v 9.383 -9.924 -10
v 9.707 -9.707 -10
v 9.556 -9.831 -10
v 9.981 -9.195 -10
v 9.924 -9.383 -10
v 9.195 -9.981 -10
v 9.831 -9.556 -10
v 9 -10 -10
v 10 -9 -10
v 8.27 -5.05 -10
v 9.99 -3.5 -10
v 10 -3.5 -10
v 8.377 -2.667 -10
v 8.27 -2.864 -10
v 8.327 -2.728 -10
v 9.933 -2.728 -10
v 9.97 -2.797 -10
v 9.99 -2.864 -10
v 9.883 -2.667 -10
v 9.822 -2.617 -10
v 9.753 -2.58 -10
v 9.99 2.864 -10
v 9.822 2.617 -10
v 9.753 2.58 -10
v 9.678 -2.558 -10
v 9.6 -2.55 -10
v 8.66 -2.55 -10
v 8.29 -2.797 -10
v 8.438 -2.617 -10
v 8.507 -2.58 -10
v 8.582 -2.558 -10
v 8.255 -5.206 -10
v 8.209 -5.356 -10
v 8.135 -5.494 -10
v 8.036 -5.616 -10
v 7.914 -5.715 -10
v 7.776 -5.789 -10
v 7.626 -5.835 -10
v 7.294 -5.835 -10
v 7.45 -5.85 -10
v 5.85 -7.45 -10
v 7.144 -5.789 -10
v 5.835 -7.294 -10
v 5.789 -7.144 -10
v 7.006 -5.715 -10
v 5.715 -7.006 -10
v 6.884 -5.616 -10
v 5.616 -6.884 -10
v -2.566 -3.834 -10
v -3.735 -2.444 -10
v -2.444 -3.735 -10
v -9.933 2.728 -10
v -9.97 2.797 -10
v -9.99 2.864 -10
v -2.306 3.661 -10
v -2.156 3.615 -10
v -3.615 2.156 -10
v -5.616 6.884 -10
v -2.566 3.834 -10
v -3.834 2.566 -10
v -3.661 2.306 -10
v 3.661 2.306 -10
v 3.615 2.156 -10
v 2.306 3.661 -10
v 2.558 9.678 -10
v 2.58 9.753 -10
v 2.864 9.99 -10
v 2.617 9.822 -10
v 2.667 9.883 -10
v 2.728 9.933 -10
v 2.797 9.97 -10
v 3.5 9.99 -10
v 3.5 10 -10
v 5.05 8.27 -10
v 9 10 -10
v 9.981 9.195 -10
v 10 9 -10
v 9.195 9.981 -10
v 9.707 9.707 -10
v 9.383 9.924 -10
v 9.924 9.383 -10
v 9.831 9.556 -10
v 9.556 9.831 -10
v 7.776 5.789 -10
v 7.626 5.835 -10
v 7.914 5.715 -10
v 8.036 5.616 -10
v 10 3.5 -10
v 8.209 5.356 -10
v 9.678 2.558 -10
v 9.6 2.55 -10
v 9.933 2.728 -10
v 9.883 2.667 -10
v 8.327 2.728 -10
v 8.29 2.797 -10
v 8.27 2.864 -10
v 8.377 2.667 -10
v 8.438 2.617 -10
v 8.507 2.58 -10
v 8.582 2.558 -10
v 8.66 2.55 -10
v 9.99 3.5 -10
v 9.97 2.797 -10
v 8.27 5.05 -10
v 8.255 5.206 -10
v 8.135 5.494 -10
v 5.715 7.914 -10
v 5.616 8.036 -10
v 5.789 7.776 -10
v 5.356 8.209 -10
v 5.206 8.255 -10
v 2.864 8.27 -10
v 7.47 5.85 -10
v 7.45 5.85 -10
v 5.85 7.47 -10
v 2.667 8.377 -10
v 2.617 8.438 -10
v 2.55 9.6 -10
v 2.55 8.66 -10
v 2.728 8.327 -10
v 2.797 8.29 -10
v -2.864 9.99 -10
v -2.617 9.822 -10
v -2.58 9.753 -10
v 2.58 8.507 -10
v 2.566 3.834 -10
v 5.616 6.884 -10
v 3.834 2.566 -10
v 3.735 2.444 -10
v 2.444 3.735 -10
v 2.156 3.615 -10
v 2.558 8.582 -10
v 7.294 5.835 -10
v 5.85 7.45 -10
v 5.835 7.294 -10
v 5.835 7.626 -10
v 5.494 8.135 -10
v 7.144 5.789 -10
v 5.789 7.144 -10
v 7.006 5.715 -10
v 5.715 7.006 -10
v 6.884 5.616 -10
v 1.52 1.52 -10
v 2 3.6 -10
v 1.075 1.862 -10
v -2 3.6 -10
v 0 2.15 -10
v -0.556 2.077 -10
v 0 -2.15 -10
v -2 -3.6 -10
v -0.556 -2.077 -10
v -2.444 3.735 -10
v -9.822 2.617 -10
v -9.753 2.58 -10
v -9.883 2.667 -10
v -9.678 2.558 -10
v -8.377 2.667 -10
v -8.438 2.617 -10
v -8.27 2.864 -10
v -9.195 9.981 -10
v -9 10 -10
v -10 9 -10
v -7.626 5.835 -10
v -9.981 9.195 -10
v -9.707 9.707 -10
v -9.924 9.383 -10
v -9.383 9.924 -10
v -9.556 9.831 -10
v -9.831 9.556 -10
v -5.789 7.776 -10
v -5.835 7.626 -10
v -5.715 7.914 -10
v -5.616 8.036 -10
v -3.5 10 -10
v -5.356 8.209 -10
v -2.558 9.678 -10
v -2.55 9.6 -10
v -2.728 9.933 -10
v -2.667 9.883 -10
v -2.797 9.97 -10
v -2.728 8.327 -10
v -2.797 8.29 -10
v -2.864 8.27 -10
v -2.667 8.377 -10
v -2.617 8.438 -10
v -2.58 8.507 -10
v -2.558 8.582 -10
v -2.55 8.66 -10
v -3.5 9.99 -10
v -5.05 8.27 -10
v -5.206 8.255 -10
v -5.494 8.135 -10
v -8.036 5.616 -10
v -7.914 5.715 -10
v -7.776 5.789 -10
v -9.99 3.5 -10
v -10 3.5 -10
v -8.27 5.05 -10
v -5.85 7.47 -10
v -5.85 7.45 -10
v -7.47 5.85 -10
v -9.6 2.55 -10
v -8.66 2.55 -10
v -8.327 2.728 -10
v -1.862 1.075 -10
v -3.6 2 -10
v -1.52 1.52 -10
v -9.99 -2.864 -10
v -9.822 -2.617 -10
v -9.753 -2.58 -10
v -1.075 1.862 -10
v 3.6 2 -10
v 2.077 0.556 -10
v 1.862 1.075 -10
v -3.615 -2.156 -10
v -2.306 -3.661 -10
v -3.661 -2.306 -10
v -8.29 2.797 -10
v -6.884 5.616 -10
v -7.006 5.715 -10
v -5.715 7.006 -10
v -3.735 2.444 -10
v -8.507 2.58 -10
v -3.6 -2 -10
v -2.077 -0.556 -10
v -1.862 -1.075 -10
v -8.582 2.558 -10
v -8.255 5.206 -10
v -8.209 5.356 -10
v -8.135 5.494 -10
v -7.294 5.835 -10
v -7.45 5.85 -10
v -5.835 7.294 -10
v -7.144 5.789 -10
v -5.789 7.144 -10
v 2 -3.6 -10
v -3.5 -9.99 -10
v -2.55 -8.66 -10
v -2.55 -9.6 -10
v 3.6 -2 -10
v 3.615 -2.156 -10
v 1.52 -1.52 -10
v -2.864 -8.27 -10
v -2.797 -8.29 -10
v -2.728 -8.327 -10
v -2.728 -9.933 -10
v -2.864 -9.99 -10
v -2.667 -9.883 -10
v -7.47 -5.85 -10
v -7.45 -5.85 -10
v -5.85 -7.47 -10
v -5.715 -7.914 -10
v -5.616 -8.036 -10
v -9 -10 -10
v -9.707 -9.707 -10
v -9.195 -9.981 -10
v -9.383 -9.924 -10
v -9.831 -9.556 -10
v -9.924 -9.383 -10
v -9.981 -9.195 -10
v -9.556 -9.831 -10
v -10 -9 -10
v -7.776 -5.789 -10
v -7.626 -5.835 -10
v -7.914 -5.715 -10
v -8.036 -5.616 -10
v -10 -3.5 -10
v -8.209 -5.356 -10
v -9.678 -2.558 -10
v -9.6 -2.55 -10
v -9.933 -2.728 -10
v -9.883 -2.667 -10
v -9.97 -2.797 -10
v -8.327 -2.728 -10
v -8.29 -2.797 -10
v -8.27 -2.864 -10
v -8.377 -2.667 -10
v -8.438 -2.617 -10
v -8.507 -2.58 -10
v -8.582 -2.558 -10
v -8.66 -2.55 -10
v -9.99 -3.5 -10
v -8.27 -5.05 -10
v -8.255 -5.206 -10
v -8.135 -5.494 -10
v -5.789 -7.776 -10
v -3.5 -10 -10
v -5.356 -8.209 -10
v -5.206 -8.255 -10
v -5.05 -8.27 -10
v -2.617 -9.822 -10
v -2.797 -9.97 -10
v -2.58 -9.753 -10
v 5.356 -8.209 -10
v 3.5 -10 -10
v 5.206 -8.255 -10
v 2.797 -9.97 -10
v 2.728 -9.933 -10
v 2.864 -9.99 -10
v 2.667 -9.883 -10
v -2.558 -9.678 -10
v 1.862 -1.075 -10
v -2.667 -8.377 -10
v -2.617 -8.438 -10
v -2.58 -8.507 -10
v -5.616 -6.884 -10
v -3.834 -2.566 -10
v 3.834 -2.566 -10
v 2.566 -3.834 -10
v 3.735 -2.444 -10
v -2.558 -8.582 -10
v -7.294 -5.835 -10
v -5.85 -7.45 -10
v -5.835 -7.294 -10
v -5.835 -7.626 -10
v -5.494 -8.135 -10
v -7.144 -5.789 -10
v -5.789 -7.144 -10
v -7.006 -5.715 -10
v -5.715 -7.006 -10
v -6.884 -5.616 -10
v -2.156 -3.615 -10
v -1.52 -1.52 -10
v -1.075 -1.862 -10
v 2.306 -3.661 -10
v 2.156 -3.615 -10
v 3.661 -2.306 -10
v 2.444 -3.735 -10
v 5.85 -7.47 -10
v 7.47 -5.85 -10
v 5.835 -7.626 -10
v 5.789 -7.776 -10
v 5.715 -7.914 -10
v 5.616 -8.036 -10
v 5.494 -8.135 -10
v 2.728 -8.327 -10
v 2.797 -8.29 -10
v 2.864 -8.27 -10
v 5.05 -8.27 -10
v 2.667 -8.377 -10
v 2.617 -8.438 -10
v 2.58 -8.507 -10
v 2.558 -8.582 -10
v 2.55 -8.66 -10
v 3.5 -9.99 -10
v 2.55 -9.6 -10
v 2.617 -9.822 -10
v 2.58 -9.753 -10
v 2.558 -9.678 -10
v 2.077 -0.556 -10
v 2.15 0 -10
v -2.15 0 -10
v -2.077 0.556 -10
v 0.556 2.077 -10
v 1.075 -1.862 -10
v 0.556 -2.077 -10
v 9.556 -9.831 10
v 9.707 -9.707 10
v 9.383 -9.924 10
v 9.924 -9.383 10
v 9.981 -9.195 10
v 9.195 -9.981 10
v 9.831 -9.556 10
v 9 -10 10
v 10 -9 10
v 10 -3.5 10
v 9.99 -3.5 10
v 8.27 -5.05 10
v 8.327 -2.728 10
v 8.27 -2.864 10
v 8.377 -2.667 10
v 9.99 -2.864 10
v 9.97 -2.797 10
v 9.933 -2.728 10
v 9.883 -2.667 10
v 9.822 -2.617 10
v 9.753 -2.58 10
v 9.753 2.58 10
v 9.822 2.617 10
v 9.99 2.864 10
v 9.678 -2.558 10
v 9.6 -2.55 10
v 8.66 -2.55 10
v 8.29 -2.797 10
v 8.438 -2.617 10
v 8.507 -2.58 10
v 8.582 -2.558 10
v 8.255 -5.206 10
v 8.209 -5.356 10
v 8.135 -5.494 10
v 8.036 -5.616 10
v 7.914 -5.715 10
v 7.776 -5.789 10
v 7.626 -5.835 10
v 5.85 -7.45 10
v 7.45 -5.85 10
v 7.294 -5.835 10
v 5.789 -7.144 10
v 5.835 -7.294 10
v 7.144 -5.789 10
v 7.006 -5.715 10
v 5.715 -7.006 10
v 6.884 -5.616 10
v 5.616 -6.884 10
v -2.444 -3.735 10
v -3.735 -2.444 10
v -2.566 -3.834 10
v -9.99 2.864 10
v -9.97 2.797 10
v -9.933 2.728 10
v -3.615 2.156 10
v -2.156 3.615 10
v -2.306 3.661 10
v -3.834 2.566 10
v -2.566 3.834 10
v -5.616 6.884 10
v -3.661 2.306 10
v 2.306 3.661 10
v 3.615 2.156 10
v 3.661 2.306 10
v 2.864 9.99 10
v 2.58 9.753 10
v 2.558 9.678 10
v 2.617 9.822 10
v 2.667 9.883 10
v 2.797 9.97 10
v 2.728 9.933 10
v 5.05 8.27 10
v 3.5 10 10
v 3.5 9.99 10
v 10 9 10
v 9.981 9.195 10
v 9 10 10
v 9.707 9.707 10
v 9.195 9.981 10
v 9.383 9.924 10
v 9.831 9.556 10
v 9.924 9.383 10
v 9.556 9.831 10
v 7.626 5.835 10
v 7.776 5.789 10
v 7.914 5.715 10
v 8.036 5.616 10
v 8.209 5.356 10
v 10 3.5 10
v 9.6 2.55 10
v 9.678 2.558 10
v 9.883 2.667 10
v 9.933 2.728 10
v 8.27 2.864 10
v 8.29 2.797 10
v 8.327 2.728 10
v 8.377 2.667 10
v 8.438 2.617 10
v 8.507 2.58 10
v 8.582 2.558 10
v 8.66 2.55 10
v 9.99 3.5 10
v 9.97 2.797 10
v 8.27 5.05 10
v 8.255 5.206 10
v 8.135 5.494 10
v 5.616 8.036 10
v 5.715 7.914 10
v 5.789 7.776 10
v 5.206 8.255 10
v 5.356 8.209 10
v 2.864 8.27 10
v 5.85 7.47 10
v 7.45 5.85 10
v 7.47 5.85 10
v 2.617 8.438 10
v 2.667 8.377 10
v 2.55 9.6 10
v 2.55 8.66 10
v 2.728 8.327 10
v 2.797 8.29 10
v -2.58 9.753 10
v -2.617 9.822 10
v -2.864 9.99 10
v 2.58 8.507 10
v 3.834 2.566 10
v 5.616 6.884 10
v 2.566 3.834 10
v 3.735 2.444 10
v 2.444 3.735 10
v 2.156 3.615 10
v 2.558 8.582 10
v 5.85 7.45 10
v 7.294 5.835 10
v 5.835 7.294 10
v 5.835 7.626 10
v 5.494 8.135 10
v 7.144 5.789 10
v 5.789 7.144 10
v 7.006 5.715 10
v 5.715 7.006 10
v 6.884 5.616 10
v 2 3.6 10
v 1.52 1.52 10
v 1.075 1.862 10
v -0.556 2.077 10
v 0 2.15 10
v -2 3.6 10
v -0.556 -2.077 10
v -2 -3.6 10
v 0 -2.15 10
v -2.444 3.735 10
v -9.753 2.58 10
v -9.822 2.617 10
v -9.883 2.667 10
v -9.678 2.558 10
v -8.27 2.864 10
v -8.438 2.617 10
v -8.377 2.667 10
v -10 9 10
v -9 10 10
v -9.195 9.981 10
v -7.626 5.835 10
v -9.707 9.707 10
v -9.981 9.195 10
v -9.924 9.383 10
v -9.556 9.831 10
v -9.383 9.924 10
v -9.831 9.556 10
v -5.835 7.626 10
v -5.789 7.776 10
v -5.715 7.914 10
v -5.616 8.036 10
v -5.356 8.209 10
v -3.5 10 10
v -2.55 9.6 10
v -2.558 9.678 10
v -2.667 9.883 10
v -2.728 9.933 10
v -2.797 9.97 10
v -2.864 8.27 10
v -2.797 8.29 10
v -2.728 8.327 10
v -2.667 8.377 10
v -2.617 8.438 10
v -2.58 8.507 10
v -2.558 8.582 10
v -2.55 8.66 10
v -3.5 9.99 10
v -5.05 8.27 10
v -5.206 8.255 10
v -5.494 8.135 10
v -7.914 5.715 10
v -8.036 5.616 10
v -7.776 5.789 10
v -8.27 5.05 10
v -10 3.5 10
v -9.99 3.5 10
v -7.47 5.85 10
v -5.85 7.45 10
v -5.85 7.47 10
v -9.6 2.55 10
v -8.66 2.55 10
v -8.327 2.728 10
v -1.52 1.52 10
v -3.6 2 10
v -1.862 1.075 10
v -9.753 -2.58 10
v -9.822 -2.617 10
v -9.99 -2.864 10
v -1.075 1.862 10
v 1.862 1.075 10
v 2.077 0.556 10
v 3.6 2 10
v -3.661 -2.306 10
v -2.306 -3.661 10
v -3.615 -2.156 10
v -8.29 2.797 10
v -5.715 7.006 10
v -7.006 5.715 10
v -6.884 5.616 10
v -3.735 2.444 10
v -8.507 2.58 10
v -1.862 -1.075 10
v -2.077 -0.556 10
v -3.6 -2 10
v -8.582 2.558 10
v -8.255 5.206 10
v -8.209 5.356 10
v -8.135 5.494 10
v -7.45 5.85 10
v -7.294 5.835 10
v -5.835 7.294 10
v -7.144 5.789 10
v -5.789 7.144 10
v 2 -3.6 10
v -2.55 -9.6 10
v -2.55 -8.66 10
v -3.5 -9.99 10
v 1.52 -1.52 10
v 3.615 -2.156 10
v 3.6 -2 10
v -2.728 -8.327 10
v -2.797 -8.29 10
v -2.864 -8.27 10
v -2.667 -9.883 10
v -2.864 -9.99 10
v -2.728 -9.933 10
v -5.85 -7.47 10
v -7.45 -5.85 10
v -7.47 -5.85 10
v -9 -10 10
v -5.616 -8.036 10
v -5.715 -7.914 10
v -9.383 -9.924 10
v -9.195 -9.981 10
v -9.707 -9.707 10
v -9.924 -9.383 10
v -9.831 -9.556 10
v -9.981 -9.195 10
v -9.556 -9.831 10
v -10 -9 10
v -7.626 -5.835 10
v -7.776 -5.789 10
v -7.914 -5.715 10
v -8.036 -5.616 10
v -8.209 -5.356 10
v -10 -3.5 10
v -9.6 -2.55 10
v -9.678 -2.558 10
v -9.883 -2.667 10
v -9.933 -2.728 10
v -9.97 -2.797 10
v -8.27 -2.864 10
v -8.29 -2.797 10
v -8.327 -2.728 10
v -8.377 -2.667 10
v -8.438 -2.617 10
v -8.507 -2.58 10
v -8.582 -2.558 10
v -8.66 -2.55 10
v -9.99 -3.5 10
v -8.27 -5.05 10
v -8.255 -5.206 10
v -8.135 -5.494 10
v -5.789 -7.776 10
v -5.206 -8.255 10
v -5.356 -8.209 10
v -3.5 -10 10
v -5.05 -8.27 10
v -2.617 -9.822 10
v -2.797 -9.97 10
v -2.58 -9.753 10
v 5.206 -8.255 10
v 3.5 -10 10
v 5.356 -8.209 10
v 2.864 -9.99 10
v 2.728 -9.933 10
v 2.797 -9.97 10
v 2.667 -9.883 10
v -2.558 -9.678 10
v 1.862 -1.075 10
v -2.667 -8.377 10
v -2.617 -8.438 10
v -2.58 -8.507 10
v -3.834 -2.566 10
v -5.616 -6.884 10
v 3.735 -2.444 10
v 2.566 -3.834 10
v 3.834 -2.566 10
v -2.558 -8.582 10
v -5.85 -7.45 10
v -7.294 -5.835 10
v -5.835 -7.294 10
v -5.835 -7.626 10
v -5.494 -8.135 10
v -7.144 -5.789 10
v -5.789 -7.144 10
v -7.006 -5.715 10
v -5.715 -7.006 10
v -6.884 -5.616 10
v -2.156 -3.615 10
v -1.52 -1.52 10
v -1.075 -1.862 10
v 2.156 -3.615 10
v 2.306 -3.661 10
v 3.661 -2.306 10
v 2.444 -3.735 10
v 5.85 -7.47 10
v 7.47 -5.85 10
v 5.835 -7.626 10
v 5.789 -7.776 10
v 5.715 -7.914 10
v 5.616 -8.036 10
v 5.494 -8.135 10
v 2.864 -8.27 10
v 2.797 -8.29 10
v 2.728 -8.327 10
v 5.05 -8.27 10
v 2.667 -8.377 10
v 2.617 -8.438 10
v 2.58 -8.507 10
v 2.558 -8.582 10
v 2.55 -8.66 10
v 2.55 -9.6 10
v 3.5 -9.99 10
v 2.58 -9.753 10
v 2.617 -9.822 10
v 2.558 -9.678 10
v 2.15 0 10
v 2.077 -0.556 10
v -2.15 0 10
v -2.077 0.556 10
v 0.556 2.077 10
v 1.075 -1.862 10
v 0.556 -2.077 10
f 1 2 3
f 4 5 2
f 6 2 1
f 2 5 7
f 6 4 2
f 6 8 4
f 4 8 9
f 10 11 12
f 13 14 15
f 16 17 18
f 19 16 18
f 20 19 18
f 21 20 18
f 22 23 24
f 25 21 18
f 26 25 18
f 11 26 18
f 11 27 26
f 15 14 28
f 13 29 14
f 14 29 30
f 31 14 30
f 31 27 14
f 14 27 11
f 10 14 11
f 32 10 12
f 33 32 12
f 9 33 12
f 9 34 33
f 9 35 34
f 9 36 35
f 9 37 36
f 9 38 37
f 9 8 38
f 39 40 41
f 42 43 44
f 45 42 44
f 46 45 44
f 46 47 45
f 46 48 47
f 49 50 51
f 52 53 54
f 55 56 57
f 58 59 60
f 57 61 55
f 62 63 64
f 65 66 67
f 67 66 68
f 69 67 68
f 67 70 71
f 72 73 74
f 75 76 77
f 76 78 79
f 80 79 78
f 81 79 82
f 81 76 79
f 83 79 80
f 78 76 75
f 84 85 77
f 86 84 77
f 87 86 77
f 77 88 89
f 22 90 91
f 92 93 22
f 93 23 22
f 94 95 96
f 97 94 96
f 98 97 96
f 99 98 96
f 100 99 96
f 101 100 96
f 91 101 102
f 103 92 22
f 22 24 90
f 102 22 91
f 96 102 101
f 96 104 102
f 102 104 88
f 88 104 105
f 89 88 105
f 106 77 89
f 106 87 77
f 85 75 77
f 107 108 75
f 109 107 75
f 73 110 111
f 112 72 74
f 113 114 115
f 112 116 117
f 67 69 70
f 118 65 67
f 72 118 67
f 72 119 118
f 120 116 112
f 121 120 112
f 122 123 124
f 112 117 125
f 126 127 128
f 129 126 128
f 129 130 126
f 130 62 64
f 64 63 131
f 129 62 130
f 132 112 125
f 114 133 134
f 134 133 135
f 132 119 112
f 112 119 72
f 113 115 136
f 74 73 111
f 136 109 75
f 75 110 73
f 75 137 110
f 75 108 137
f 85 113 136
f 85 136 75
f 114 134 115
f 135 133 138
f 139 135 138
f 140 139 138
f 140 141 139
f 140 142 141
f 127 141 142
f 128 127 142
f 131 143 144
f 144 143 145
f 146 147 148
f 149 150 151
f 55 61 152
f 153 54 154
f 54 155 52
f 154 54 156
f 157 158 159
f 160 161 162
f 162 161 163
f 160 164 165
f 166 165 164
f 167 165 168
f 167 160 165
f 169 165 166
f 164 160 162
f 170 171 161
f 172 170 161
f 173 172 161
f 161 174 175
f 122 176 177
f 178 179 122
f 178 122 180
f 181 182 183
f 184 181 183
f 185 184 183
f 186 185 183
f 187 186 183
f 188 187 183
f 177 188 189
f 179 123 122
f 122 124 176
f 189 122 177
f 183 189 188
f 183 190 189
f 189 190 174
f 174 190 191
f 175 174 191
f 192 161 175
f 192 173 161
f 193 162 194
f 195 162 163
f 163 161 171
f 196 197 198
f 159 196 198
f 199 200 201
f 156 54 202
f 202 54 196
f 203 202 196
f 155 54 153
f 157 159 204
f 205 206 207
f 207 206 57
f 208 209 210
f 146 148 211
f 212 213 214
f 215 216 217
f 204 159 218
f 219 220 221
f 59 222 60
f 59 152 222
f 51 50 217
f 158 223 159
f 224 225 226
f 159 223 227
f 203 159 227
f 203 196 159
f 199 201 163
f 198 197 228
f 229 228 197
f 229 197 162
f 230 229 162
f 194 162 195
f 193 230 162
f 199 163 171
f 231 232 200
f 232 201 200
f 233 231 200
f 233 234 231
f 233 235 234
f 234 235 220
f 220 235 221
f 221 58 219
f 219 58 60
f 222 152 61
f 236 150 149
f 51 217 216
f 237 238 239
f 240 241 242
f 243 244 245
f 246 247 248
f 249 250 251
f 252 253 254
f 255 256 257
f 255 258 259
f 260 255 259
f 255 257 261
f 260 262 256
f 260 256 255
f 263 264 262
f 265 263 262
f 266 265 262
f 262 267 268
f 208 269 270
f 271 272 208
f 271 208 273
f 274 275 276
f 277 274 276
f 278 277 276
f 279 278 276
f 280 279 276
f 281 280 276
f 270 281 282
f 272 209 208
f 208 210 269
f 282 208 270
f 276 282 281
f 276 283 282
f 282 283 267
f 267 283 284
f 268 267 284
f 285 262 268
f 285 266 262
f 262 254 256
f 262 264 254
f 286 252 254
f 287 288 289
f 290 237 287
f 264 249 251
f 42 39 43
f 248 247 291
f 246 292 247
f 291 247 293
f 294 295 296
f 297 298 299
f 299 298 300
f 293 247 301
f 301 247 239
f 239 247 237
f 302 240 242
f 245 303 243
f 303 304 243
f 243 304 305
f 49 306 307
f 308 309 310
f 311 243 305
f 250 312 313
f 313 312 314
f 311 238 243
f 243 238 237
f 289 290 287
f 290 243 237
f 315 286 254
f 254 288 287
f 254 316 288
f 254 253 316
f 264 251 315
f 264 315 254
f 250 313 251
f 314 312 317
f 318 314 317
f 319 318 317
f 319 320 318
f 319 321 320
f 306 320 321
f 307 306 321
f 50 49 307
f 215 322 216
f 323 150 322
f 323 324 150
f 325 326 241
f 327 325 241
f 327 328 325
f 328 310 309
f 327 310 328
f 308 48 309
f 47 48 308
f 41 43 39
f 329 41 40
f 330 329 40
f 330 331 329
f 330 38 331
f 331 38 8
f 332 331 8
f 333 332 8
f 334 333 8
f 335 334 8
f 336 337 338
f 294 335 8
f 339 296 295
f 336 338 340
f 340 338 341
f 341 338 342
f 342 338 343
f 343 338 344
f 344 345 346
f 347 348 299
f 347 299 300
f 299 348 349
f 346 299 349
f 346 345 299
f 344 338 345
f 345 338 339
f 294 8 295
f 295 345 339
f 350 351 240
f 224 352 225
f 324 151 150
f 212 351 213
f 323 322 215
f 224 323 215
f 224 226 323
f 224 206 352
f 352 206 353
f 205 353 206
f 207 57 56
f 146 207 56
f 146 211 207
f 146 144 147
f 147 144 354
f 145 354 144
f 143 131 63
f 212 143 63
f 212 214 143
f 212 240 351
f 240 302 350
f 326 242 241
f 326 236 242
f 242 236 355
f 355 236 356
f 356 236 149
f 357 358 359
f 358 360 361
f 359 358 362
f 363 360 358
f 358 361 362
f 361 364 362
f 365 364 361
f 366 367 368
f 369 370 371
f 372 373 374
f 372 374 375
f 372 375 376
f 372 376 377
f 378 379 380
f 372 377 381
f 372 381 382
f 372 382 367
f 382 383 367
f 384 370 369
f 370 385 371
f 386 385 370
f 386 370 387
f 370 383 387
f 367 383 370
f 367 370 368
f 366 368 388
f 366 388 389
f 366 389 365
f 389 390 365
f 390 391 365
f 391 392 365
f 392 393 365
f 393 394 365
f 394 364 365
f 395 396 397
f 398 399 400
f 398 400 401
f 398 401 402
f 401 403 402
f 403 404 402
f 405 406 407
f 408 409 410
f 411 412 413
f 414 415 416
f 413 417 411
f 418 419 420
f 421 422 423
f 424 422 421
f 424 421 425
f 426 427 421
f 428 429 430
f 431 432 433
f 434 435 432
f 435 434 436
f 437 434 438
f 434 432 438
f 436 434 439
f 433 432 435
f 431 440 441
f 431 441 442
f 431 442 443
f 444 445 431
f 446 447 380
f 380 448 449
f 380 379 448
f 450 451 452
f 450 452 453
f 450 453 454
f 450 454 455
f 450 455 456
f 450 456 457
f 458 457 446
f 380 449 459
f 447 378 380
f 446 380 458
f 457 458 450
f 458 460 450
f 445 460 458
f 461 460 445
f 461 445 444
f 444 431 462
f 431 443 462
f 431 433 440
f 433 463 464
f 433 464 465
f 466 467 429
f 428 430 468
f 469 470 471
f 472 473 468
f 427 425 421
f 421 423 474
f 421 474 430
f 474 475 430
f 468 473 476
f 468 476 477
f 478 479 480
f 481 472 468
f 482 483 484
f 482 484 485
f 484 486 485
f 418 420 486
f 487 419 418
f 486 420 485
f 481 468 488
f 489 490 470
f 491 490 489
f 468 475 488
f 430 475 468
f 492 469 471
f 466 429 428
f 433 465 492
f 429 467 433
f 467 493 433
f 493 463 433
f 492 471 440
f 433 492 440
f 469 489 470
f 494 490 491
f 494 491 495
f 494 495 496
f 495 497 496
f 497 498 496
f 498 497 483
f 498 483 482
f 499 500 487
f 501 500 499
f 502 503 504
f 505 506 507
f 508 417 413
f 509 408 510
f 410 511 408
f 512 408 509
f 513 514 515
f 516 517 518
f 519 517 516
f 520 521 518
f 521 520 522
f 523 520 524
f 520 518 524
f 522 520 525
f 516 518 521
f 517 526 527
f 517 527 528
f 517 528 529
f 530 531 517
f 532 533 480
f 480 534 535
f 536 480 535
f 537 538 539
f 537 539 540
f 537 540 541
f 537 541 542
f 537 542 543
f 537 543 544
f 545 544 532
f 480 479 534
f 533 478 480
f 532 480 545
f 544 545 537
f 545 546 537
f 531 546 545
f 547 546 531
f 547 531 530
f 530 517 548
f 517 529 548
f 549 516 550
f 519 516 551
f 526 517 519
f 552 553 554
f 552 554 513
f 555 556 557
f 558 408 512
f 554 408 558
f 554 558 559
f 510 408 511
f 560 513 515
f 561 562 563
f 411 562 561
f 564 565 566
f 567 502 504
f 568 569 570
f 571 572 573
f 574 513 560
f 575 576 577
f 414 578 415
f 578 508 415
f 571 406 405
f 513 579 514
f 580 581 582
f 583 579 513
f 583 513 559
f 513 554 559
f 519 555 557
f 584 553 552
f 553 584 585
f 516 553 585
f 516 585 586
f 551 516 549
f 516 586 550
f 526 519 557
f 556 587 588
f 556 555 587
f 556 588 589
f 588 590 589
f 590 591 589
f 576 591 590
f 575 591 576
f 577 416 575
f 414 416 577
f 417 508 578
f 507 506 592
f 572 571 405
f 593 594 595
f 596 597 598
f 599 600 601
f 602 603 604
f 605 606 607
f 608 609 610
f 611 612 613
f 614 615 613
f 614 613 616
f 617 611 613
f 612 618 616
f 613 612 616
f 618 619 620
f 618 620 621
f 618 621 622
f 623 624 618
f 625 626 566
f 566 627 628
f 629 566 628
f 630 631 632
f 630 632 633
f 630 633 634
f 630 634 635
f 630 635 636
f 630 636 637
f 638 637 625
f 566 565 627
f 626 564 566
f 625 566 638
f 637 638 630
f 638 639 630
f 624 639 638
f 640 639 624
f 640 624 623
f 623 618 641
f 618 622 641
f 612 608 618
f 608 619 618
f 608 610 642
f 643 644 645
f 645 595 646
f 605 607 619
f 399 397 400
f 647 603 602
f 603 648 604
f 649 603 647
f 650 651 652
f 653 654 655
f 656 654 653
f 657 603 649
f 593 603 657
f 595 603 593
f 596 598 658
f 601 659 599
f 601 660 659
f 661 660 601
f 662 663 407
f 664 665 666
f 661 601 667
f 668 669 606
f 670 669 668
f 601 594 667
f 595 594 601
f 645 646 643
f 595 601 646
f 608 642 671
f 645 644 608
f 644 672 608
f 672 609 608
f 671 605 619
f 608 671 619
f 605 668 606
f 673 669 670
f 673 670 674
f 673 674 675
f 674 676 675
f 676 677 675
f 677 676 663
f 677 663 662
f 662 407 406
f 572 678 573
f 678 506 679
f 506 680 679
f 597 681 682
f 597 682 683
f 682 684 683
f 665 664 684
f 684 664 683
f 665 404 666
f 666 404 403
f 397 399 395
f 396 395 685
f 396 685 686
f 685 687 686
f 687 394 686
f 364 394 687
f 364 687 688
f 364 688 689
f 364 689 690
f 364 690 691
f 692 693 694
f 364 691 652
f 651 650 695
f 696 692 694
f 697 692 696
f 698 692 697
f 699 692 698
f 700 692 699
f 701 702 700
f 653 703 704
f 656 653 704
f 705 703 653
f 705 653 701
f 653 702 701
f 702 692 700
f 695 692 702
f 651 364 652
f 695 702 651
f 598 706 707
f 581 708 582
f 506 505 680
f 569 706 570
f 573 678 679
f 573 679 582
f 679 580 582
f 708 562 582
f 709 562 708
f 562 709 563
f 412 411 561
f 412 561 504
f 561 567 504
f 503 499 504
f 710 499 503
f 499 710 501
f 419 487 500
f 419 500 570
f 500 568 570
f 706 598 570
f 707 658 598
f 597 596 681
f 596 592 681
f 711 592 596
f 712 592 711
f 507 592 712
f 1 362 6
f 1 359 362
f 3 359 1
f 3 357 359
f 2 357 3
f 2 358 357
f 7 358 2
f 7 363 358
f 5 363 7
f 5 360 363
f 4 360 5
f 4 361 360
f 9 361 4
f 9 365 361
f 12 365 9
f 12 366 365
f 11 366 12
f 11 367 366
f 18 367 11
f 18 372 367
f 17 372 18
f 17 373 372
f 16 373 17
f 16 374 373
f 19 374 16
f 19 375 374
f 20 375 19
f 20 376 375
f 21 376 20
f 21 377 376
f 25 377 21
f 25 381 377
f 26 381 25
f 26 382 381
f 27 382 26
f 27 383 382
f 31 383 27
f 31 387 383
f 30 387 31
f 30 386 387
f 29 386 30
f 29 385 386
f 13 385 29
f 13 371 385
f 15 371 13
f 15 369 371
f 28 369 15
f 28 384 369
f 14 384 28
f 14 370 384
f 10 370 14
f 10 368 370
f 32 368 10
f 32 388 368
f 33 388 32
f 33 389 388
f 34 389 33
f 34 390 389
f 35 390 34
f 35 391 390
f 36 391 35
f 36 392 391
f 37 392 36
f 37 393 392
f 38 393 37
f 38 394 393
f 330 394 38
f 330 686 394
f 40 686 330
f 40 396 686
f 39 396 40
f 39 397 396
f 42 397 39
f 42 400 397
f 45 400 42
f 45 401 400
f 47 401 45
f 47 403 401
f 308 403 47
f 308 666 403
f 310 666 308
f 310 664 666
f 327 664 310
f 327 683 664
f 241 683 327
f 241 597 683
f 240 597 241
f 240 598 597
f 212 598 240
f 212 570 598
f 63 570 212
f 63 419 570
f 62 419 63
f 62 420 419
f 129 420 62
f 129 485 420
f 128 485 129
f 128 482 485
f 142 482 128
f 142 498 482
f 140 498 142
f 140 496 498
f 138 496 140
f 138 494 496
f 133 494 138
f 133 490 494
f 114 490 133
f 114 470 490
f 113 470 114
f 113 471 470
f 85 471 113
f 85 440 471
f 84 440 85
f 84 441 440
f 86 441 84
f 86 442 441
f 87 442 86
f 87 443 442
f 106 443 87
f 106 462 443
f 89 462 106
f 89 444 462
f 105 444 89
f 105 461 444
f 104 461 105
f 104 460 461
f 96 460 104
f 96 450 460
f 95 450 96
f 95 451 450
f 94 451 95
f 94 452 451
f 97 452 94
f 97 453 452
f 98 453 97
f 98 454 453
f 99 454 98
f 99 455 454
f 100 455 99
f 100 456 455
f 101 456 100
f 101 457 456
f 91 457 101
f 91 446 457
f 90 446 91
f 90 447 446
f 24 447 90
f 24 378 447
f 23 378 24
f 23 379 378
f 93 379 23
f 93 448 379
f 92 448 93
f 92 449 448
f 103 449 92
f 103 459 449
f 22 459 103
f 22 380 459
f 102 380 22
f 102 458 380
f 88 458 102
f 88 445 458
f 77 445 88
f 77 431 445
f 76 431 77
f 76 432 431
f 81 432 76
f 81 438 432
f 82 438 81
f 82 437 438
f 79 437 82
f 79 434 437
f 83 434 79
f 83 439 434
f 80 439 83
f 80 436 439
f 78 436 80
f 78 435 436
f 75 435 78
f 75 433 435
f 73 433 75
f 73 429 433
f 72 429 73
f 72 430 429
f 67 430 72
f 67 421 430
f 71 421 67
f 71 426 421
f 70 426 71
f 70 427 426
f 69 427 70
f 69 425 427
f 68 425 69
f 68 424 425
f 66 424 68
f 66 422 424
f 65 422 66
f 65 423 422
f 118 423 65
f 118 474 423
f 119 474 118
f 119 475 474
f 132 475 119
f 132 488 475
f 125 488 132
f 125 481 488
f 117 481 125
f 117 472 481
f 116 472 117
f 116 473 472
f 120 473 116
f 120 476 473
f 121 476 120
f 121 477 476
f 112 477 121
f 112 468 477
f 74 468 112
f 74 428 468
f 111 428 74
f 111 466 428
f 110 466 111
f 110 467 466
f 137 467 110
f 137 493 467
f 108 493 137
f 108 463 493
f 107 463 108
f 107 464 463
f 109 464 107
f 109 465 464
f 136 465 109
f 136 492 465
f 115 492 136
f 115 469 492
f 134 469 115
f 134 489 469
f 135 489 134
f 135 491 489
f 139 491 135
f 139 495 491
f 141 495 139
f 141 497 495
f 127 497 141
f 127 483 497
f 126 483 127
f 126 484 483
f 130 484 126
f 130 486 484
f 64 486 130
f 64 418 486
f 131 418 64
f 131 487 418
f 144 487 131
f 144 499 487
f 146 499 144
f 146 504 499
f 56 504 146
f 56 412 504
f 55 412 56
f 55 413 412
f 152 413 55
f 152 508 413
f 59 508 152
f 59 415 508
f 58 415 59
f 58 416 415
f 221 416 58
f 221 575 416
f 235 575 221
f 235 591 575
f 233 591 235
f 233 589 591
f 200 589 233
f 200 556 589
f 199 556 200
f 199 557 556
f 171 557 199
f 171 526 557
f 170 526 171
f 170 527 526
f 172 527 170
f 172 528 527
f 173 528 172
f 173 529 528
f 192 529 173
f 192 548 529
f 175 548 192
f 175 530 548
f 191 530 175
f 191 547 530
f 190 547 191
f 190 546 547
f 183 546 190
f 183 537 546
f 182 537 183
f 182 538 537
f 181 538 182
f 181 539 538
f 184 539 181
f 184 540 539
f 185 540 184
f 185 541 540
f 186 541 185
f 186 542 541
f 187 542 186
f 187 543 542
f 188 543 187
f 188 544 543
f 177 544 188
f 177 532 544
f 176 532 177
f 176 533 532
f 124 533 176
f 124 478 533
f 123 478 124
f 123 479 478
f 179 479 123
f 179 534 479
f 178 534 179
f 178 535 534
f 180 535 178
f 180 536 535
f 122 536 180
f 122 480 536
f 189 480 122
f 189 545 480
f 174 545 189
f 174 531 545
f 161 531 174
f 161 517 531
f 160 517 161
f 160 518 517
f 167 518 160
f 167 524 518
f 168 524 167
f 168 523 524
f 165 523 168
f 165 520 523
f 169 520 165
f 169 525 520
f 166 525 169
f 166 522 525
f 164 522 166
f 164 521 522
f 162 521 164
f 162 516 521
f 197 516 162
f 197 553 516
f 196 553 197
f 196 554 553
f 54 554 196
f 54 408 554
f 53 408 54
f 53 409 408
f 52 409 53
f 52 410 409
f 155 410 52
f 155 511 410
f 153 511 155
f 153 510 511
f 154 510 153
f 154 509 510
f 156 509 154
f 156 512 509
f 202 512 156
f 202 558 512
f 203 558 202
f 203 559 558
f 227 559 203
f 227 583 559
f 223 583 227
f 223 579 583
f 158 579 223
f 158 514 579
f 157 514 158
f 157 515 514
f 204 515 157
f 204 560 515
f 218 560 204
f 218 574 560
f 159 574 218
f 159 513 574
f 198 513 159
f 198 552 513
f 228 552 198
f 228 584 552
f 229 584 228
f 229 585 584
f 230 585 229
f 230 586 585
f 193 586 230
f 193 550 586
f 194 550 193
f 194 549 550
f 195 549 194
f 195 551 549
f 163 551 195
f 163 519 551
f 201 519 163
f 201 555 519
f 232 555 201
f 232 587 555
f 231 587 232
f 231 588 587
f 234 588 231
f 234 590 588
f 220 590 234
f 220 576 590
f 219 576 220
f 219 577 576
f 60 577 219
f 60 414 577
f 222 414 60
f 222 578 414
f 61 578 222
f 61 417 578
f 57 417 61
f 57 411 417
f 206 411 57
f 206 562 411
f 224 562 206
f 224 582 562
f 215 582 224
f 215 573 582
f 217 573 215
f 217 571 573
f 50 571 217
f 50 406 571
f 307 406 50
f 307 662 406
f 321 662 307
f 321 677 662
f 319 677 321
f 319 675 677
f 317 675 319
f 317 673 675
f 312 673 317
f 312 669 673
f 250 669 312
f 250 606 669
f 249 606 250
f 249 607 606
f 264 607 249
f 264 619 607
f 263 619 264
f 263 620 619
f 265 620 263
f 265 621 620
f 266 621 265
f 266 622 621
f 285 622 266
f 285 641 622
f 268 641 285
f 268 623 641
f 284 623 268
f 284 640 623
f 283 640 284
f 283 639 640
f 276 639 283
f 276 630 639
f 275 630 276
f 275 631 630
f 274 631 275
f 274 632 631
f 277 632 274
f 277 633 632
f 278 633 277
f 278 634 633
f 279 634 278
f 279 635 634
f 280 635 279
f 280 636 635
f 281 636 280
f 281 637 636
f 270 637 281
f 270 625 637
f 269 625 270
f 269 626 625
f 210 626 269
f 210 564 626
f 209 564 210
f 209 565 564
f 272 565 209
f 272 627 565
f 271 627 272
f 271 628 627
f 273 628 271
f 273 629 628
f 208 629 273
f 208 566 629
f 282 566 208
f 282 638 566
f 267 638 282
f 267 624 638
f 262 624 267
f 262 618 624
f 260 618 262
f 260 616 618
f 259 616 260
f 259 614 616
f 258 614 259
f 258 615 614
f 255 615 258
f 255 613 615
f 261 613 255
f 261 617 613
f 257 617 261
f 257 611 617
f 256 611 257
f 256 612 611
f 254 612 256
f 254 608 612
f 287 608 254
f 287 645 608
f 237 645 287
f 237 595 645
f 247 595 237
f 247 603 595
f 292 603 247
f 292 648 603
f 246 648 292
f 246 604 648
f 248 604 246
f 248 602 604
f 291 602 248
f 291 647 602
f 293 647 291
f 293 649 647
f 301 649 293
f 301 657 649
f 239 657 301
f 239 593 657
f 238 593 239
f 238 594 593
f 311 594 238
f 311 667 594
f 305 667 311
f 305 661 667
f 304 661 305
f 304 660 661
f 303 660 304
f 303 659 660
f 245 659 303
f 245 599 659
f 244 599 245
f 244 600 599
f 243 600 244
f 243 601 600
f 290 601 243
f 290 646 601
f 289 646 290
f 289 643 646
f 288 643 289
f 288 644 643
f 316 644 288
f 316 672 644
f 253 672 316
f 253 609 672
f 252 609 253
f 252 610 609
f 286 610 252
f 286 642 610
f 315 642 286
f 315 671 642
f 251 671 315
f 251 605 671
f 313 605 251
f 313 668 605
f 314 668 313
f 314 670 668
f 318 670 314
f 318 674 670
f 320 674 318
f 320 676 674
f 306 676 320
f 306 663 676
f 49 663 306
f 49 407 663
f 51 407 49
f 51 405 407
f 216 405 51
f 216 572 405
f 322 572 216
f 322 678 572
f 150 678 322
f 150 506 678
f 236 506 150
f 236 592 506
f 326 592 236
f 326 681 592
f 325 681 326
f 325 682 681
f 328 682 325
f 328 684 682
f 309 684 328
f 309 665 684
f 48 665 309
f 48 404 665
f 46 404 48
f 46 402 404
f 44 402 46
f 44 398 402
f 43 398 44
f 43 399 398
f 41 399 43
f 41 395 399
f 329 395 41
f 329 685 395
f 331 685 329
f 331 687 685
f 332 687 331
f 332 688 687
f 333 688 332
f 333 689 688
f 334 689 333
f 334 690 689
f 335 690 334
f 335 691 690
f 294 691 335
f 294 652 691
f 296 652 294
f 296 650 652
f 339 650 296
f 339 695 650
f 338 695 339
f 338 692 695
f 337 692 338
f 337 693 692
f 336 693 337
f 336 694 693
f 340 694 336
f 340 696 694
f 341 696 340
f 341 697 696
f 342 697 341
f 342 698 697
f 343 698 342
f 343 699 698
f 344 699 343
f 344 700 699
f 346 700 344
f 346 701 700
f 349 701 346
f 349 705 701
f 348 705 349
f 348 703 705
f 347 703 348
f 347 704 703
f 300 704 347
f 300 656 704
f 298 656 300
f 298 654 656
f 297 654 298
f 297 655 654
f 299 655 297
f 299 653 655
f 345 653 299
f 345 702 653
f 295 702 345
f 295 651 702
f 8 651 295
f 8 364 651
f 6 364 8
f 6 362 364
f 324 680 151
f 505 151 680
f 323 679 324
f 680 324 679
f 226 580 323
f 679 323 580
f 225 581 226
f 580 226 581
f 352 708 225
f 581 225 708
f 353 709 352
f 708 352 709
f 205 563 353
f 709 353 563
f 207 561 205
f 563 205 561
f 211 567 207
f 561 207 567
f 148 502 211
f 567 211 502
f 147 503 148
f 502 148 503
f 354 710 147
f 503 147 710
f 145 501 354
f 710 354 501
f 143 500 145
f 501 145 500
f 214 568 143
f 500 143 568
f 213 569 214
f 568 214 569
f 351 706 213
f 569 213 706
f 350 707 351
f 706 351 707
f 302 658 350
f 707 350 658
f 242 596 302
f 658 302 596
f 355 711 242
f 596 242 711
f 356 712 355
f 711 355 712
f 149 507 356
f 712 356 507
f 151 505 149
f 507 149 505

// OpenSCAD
/** 
 * @file
 * Generic library for fractional T-Slot extrusions.
 *
 * Creative Commons Share Alike 3.0
 * Copyright (c) 2014 Manuel García
 *
 * Original library (David Lee Miller)
 * https://www.thingiverse.com/thing:136430
 * 
 * Modified to be used in customizer
 */ 

//CUSTOMIZER VARIABLES

ProfileCore = 4.3 * 1;     // Profile core Ø (Default M5).
minkR_TS = 0.04 * 20;  // Minkowski radius for the T-Slot.
minkR_IC = 0.075 * 20; // Minkowski radius for the inner cutout.
minkR_PF = 0.05 * 20;  // Minkowski radius for the profile corners.

//Choose the TShot
profile = "2020"; //[2020, 2040, 2060, 2080]

//Choose the Profile Core
profile_core = "M5"; //[M5, M6]

//Select Height in Millimeters
height_in_mm = 20;

if(profile_core == "M5"){
    ProfileCore = 4.3;     // Profile core Ø (Default M5).
} else if(profile_core == "M6"){
    ProfileCore = 5.3;     // Profile core Ø (M6).
}

if(profile == "2020"){
    2020Profile(height_in_mm);
}else if(profile == "2040"){
    2040Profile(height_in_mm);
}

//CUSTOMIZER VARIABLES END

module 2020Profile(height, core = ProfileCore) {
  linear_extrude(height = height, center = true)
  union() {
    difference() {
      minkowski() {
        translate([0, 0, 0]) circle(r = minkR_PF, center = true, $fn = 32);
        square([1 * 20 - 2 * minkR_PF, 1 * 20 - 2 * minkR_PF], center = true);
      }
      translate([0, 0, 0]) circle(r = core / 2, $fn = 24);
      translate([-0.5 * 20 + 0.087 * 20, 0, 0]) tSlot();
      rotate([0, 0, 180]) translate([-0.5 * 20 + 0.087 * 20, 0, 0]) tSlot();
      translate([0, -0.5 * 20 + 0.087 * 20, 0]) rotate([0, 0, 90]) tSlot();
      translate([0, 0.5 * 20 - 0.087 * 20, 0]) rotate([0, 0, -90]) tSlot();
    }
  }
}

module 2040Profile(height, core = ProfileCore) {
  linear_extrude(height = height, center = true)
  difference() {
    minkowski() {
      translate([0, 0, 0]) circle(r = minkR_PF, center = true, $fn = 32);
      square([1 * 20 - 2 * minkR_PF, 2 * 20 - 2 * minkR_PF], center = true);
    }
    translate([0, 0.5 * 20, 0]) circle(r = core / 2, $fn = 24);
    translate([0, -0.5 * 20, 0]) circle(r = core / 2, $fn = 24);
    translate([0, 0, 0]) insideCutout();
    translate([-0.5 * 20 + 0.087 * 20, 0.5 * 20, 0]) tSlot();
    rotate([0, 0, 180]) translate([-0.5 * 20 + 0.087 * 20, 0.5 * 20, 0]) tSlot();
    translate([-0.5 * 20 + 0.087 * 20, -0.5 * 20, 0]) tSlot();
    rotate([0, 0, 180]) translate([-0.5 * 20 + 0.087 * 20, -0.5 * 20, 0]) tSlot();
    translate([0, -1 * 20 + 0.087 * 20, 0]) rotate([0, 0, 90]) tSlot();
    translate([0, 1 * 20 - 0.087 * 20, 0]) rotate([0, 0, -90]) tSlot();
  }
}

module fillet(rad) {
  translate([-rad, -rad, 0])
  difference() {
    translate([0, 0, 0]) square([rad + 0.01, rad + 0.01]);
    circle(r = rad, center = true, $fn = 32);
  }
}

module insideCutout() {
  minkowski() {
    translate([0, 0, 0]) circle(r = minkR_IC, center = true, $fn = 32);
    hull() {
      square([0.2 * 20 - minkR_IC, 0.645 * 20 - 2 * minkR_IC], center = true);
      square([0.8 * 20 - 2 * minkR_IC, 0.001 * 20], center = true);
    }
  }
}

module doubleCutout() {
  union() {
    minkowski() {
      translate([0, 0, 0]) circle(r = minkR_IC, center = true, $fn = 32);
      union() {
        rotate([0, 0, 0]) hull() {
          translate([-0.5 * 20, 0, 0]) hull() {
            square([0.2 * 20 - minkR_IC, 0.645 * 20 - 2 * minkR_IC], center = true);
            square([0.8 * 20 - 2 * minkR_IC, 0.001 * 20], center = true);
          }
          translate([0.5 * 20, 0, 0]) hull() {
            square([0.2 * 20 - minkR_IC, 0.645 * 20 - 2 * minkR_IC], center = true);
            square([0.8 * 20 - 2 * minkR_IC, 0.001 * 20], center = true);
          }
        }
        rotate([0, 0, 90]) hull() {
          translate([-0.5 * 20, 0, 0]) hull() {
            square([0.2 * 20 - minkR_IC, 0.645 * 20 - 2 * minkR_IC], center = true);
            square([0.8 * 20 - 2 * minkR_IC, 0.001 * 20], center = true);
          }
          translate([0.5 * 20, 0, 0]) hull() {
            square([0.2 * 20 - minkR_IC, 0.645 * 20 - 2 * minkR_IC], center = true);
            square([0.8 * 20 - 2 * minkR_IC, 0.001 * 20], center = true);
          }
        }
      }
    }
    rotate([0, 0, 0]) translate([-0.645 * 20 / 2, -0.645 * 20 / 2, 0]) fillet(minkR_IC);
    rotate([0, 0, 180]) translate([-0.645 * 20 / 2, -0.645 * 20 / 2, 0]) fillet(minkR_IC);
    rotate([0, 0, 90]) translate([-0.645 * 20 / 2, -0.645 * 20 / 2, 0]) fillet(minkR_IC);
    rotate([0, 0, -90]) translate([-0.645 * 20 / 2, -0.645 * 20 / 2, 0]) fillet(minkR_IC);
  }
}

module tSlot() {
  union() {
    translate([minkR_TS, 0, 0])
    minkowski() {
      translate([0, 0, 0]) circle(r = minkR_TS, center = true, $fn = 32);
      hull() {
        square([0.001 * 20, 0.585 * 20 - 2 * minkR_TS], center = true);
        translate([(0.233 * 20 - 2 * minkR_TS) / 2, 0, 0]) square([0.233 * 20 - 2 * minkR_TS, 0.2 * 20], center = true);
      }
    }
    translate([-0.255 * 20 / 2 + 0.01, 0, 0]) square(0.255 * 20, center = true);
    translate([-0.35 * 20 / 2 - 0.087 * 20 + 0.01, 0, 0]) square(0.35 * 20, center = true);
    translate([0, -0.255 * 20 / 2, 0]) fillet(minkR_TS / 2);
    translate([-0.087 * 20, -0.255 * 20 / 2, 0]) rotate([0, 0, 90]) fillet(minkR_TS / 2);
    scale([1, -1, 1]) translate([0, -0.255 * 20 / 2, 0]) fillet(minkR_TS / 2);
    scale([1, -1, 1]) translate([-0.087 * 20, -0.255 * 20 / 2, 0]) rotate([0, 0, 90]) fillet(minkR_TS / 2);
  }
}
